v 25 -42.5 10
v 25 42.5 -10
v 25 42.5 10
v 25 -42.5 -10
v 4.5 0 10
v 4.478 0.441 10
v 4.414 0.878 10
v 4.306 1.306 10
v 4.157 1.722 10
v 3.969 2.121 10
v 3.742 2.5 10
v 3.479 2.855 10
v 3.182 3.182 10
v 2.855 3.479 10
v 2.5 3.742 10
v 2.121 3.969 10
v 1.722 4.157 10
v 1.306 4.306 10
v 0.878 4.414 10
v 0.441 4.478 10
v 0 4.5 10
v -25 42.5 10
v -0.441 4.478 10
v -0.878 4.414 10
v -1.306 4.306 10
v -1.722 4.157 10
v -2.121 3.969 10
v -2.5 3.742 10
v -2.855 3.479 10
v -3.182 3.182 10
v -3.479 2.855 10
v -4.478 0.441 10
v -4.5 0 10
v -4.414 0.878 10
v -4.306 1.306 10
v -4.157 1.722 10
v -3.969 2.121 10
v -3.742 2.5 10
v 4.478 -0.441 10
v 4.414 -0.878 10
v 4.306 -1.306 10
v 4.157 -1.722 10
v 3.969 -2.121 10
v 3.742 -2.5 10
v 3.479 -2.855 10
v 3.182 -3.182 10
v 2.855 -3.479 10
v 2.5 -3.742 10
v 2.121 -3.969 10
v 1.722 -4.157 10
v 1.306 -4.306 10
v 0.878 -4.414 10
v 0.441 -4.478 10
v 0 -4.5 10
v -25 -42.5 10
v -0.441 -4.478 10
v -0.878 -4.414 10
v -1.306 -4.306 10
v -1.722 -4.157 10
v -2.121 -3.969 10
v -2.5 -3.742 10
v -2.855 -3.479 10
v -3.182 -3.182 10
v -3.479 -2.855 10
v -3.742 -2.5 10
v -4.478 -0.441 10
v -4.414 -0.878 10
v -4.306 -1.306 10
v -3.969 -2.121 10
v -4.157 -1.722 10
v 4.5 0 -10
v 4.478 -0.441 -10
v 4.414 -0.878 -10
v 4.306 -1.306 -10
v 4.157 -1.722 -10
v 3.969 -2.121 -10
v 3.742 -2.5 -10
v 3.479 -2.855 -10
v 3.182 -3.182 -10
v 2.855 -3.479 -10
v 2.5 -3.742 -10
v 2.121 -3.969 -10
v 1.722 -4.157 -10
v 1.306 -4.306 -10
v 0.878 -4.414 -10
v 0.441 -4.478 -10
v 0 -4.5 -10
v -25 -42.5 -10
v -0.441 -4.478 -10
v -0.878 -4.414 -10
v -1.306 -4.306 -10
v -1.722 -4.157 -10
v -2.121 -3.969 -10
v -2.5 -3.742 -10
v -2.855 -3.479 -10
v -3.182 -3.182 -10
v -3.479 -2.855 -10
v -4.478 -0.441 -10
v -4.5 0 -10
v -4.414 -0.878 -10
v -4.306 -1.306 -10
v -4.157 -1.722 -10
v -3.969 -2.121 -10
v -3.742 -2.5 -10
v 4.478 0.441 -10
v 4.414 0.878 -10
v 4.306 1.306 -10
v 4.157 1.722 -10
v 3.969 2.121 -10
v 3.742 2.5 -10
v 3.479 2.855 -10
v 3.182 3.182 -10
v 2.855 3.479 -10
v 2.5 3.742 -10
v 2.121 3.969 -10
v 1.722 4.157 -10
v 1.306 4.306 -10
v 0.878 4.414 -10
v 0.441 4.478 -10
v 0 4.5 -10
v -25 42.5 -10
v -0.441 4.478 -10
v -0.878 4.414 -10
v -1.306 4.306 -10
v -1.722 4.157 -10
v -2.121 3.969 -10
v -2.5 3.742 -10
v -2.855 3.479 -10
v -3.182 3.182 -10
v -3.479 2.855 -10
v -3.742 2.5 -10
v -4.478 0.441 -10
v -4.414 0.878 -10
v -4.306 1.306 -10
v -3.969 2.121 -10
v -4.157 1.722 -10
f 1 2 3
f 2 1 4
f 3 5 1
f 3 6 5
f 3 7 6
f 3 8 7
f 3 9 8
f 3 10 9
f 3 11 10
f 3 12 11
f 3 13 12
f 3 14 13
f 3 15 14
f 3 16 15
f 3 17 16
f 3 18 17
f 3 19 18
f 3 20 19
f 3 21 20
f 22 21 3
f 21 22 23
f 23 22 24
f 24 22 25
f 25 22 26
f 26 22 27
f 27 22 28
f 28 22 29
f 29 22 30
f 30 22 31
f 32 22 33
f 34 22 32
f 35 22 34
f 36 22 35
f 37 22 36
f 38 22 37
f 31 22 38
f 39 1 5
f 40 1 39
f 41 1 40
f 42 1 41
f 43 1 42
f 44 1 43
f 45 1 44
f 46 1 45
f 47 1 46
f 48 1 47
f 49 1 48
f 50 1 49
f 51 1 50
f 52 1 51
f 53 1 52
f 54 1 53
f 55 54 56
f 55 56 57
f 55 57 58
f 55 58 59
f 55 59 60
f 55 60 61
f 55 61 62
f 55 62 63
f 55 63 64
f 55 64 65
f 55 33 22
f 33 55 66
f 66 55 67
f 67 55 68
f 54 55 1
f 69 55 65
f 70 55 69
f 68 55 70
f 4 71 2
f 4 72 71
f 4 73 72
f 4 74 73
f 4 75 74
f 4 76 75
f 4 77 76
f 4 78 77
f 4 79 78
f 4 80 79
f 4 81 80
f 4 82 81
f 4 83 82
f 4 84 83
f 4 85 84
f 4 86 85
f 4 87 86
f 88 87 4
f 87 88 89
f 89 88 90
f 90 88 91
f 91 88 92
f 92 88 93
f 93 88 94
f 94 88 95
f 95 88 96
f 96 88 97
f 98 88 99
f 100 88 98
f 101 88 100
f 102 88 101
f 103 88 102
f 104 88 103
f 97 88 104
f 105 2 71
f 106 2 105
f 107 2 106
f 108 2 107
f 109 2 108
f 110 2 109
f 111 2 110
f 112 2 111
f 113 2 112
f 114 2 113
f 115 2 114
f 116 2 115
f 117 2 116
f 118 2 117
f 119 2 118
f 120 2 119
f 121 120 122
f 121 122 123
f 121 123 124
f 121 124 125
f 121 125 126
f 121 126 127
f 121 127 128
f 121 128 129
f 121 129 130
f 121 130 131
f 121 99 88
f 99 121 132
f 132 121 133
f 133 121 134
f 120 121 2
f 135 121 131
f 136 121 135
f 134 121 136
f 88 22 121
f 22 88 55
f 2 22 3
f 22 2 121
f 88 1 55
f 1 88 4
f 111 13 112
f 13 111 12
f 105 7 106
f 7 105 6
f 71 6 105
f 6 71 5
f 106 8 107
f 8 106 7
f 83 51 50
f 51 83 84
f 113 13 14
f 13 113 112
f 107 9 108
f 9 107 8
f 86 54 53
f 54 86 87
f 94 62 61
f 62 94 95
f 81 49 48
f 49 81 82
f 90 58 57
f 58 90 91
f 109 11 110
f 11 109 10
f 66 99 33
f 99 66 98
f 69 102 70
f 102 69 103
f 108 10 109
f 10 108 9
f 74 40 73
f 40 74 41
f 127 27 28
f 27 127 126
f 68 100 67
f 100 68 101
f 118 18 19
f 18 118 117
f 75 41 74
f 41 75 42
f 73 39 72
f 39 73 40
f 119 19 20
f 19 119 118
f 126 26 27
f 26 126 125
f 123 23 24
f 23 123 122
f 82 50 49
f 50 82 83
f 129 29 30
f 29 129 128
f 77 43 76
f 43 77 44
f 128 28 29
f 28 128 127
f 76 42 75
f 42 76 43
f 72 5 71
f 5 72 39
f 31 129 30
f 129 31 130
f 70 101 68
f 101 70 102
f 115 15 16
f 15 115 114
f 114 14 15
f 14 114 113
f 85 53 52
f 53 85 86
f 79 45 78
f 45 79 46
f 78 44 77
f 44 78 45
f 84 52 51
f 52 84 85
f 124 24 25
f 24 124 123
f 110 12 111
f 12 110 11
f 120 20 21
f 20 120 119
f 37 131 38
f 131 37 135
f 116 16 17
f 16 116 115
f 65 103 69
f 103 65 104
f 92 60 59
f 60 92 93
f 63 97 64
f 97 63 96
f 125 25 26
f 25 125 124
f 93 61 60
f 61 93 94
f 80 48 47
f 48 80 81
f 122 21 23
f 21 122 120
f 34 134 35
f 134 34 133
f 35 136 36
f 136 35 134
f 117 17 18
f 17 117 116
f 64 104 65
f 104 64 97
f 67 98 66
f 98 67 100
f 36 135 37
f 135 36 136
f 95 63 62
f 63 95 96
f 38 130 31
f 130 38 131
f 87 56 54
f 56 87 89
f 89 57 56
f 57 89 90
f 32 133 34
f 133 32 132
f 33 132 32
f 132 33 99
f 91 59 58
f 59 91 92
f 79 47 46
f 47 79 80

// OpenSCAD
module linear_bearing_block() {
    difference() {
        // Main block
        cube([50, 85, 20], center = true);
        
        // Shaft hole
        translate([0, 0, 0])
            cylinder(h = 20, d = 9, $fn = 64, center = true);
    }
}

linear_bearing_block();
